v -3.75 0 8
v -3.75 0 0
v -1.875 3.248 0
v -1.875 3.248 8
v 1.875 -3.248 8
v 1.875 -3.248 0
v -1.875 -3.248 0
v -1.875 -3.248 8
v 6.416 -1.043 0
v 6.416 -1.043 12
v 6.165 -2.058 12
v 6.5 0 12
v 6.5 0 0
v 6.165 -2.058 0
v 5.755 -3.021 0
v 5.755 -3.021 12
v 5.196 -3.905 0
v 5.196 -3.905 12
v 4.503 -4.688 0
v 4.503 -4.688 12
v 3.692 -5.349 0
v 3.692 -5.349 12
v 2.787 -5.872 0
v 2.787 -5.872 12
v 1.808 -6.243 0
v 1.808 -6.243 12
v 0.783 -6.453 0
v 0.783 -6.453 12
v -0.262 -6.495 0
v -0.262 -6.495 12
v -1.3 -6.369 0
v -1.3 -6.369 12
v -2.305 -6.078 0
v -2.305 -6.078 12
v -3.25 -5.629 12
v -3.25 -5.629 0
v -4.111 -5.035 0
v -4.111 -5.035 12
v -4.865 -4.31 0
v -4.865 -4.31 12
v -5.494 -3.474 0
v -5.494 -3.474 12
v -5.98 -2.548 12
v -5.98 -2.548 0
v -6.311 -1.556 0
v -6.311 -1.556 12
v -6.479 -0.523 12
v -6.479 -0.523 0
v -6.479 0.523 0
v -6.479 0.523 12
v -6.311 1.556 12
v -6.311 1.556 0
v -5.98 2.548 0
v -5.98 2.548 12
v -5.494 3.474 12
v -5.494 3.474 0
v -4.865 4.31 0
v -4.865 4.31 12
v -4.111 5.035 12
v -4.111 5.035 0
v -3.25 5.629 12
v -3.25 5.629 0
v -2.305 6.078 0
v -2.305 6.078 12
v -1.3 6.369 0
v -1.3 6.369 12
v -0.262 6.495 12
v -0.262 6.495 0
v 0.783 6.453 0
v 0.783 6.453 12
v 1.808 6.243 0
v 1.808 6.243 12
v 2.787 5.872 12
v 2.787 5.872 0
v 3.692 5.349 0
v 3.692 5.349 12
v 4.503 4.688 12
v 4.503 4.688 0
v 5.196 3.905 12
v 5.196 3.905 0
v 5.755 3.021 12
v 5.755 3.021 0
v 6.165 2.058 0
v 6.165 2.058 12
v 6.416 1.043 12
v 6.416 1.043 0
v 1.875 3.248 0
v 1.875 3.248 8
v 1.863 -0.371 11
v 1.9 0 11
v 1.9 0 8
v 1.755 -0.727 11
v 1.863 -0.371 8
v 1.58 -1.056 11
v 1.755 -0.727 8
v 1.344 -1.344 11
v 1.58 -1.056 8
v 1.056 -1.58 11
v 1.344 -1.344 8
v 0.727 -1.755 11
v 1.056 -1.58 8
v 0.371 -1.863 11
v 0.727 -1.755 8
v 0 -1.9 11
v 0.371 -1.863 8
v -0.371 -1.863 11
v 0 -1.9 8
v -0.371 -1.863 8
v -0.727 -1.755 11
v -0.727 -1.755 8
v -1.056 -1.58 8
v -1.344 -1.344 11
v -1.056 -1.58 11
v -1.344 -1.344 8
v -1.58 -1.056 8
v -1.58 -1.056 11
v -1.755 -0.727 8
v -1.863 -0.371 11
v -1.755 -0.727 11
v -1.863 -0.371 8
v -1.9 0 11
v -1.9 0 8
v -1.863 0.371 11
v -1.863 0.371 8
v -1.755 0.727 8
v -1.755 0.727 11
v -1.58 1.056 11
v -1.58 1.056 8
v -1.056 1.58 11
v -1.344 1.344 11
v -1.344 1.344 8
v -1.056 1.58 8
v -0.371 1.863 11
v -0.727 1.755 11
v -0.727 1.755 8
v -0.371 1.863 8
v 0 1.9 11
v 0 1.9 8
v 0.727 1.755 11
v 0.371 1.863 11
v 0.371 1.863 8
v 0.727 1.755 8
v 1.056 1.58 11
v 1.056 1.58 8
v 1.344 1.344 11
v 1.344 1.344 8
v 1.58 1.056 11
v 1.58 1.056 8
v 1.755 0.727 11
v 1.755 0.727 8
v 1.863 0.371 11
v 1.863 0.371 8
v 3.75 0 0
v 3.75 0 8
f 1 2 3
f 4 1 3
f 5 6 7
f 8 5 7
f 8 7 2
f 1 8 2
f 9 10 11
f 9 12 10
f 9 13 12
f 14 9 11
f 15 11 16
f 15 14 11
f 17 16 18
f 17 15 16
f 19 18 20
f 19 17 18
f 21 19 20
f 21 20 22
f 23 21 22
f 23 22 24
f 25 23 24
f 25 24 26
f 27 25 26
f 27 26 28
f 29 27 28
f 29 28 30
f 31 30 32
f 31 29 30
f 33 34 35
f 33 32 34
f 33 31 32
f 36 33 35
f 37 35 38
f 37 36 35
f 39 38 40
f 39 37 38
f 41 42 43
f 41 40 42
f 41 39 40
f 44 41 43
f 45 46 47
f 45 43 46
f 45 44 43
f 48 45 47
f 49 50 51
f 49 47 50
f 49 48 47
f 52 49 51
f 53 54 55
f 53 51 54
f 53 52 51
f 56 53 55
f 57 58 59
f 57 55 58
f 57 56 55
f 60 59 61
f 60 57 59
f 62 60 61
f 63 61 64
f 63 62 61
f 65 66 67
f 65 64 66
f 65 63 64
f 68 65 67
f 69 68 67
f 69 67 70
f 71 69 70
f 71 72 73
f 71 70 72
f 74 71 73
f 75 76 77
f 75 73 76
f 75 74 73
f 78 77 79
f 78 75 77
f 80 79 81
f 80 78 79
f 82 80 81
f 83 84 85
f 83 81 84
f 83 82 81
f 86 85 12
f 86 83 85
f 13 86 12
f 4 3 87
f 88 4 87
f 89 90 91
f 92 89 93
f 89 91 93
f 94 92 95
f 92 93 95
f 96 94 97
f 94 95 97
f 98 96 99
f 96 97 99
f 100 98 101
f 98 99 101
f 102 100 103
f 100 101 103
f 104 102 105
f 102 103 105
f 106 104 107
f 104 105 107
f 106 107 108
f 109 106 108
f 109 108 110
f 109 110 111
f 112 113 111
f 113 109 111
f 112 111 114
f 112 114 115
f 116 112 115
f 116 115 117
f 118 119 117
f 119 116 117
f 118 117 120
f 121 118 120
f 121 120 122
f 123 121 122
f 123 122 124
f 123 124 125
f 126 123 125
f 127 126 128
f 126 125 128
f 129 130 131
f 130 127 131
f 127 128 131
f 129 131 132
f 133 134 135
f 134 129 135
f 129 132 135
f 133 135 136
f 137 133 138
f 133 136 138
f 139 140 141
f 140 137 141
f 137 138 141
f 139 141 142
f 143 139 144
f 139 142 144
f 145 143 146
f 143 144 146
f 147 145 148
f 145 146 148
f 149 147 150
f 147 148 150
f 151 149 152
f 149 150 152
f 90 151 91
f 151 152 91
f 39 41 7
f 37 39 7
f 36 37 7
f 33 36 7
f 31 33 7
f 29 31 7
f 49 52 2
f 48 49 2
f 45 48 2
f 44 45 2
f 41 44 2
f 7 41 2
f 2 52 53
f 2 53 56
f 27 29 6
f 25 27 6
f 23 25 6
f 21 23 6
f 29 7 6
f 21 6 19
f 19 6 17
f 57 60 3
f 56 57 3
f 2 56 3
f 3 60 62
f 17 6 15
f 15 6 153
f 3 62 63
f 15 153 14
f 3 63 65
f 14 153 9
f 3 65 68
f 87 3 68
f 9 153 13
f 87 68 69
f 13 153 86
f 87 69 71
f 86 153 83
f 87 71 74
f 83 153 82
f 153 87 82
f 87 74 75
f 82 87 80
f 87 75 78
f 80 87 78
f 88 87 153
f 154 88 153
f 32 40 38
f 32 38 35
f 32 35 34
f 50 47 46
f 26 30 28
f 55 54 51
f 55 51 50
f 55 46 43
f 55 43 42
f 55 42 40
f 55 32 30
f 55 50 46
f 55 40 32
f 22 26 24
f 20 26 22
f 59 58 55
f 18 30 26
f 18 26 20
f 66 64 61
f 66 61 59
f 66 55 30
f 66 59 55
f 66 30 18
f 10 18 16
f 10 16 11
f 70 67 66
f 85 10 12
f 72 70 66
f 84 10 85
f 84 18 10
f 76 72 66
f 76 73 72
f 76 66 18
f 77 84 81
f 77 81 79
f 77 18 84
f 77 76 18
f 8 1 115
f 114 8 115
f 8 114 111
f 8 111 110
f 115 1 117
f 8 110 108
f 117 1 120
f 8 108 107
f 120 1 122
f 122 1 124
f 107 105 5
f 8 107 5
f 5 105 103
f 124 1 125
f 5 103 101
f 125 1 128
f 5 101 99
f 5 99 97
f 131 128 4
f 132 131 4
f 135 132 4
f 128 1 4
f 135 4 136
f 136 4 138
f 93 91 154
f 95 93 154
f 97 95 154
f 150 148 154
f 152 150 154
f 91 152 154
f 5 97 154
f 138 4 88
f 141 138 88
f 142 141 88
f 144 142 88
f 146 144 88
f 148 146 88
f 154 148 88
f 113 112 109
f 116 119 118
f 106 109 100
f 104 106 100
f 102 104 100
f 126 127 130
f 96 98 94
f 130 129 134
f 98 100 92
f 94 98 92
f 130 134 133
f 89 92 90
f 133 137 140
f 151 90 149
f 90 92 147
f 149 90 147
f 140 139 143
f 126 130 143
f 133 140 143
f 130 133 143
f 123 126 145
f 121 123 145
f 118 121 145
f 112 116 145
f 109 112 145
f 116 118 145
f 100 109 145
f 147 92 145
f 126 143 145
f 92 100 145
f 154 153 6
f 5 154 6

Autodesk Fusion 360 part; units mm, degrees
sketch "post void" plane through (0, 0, 0) normal (0, 0, 1) x (1, 0, 0)
  circle A0 centre (0, 0) radius 3.75
  line L0 (0, 0) -> (1.875, 3.2476)
  line L1 (0, 0) -> (3.75, 0) construction
  line L2 (0, 0) -> (-1.875, 3.2476)
  line L3 (0, 0) -> (-3.75, 0)
  line L4 (0, 0) -> (-1.875, -3.2476)
  line L5 (0, 0) -> (1.875, -3.2476)
  line L6 (0, 0) -> (3.75, 0)
  line L7 (3.75, 0) -> (1.875, -3.2476)
  line L8 (1.875, -3.2476) -> (-1.875, -3.2476)
  line L9 (-1.875, -3.2476) -> (-3.75, 0)
  line L10 (-3.75, 0) -> (-1.875, 3.2476)
  line L11 (-1.875, 3.2476) -> (1.875, 3.2476)
  line L12 (1.875, 3.2476) -> (3.75, 0)
  dimension "d32" = 7.5
  dimension "d34" = 60
  dimension "d35" = 3.75
  dimension "d36" = 60
  dimension "d37" = 3.75
  dimension "d38" = 60
  dimension "d39" = 3.75
  dimension "d40" = 60
  dimension "d41" = 3.75
  dimension "d42" = 60
  dimension "d43" = 3.75
  dimension "d44" = 60
  dimension "d45" = 3.75
sketch "Wall" plane through (0, 0, 0) normal (0, 0, 1) x (1, 0, 0)
  circle A0 centre (0, 0) radius 6.5
  dimension "d46" = 13
extrude "Extrude1" add sketch "Wall" along normal blind 12
extrude "Extrude2" cut sketch "post void" along normal blind 8 contours L5 L6 L7 | L0 L6 L12 | L0 L2 L11 | L4 L5 L8 | L2 L3 L10 | L3 L4 L9
sketch "Sketch3" plane through (0, 0, 0) normal (0, 0, 1) x (1, 0, 0)
  circle A0 centre (0, 0) radius 1.9
  dimension "d51" = 3.8
extrude "Extrude3" cut sketch "Sketch3" along normal blind 11
equation "d35 = ( 7.5 / 2 ) * 1 mm"
equation "d37 = ( 7.5 / 2 ) * 1 mm"
equation "d39 = ( 7.5 / 2 ) * 1 mm"
equation "d41 = ( 7.5 / 2 ) * 1 mm"
equation "d43 = ( 7.5 / 2 ) * 1 mm"
equation "d45 = ( 7.5 / 2 ) * 1 mm"
equation "d49 = 10.00 mm - 2 mm"
